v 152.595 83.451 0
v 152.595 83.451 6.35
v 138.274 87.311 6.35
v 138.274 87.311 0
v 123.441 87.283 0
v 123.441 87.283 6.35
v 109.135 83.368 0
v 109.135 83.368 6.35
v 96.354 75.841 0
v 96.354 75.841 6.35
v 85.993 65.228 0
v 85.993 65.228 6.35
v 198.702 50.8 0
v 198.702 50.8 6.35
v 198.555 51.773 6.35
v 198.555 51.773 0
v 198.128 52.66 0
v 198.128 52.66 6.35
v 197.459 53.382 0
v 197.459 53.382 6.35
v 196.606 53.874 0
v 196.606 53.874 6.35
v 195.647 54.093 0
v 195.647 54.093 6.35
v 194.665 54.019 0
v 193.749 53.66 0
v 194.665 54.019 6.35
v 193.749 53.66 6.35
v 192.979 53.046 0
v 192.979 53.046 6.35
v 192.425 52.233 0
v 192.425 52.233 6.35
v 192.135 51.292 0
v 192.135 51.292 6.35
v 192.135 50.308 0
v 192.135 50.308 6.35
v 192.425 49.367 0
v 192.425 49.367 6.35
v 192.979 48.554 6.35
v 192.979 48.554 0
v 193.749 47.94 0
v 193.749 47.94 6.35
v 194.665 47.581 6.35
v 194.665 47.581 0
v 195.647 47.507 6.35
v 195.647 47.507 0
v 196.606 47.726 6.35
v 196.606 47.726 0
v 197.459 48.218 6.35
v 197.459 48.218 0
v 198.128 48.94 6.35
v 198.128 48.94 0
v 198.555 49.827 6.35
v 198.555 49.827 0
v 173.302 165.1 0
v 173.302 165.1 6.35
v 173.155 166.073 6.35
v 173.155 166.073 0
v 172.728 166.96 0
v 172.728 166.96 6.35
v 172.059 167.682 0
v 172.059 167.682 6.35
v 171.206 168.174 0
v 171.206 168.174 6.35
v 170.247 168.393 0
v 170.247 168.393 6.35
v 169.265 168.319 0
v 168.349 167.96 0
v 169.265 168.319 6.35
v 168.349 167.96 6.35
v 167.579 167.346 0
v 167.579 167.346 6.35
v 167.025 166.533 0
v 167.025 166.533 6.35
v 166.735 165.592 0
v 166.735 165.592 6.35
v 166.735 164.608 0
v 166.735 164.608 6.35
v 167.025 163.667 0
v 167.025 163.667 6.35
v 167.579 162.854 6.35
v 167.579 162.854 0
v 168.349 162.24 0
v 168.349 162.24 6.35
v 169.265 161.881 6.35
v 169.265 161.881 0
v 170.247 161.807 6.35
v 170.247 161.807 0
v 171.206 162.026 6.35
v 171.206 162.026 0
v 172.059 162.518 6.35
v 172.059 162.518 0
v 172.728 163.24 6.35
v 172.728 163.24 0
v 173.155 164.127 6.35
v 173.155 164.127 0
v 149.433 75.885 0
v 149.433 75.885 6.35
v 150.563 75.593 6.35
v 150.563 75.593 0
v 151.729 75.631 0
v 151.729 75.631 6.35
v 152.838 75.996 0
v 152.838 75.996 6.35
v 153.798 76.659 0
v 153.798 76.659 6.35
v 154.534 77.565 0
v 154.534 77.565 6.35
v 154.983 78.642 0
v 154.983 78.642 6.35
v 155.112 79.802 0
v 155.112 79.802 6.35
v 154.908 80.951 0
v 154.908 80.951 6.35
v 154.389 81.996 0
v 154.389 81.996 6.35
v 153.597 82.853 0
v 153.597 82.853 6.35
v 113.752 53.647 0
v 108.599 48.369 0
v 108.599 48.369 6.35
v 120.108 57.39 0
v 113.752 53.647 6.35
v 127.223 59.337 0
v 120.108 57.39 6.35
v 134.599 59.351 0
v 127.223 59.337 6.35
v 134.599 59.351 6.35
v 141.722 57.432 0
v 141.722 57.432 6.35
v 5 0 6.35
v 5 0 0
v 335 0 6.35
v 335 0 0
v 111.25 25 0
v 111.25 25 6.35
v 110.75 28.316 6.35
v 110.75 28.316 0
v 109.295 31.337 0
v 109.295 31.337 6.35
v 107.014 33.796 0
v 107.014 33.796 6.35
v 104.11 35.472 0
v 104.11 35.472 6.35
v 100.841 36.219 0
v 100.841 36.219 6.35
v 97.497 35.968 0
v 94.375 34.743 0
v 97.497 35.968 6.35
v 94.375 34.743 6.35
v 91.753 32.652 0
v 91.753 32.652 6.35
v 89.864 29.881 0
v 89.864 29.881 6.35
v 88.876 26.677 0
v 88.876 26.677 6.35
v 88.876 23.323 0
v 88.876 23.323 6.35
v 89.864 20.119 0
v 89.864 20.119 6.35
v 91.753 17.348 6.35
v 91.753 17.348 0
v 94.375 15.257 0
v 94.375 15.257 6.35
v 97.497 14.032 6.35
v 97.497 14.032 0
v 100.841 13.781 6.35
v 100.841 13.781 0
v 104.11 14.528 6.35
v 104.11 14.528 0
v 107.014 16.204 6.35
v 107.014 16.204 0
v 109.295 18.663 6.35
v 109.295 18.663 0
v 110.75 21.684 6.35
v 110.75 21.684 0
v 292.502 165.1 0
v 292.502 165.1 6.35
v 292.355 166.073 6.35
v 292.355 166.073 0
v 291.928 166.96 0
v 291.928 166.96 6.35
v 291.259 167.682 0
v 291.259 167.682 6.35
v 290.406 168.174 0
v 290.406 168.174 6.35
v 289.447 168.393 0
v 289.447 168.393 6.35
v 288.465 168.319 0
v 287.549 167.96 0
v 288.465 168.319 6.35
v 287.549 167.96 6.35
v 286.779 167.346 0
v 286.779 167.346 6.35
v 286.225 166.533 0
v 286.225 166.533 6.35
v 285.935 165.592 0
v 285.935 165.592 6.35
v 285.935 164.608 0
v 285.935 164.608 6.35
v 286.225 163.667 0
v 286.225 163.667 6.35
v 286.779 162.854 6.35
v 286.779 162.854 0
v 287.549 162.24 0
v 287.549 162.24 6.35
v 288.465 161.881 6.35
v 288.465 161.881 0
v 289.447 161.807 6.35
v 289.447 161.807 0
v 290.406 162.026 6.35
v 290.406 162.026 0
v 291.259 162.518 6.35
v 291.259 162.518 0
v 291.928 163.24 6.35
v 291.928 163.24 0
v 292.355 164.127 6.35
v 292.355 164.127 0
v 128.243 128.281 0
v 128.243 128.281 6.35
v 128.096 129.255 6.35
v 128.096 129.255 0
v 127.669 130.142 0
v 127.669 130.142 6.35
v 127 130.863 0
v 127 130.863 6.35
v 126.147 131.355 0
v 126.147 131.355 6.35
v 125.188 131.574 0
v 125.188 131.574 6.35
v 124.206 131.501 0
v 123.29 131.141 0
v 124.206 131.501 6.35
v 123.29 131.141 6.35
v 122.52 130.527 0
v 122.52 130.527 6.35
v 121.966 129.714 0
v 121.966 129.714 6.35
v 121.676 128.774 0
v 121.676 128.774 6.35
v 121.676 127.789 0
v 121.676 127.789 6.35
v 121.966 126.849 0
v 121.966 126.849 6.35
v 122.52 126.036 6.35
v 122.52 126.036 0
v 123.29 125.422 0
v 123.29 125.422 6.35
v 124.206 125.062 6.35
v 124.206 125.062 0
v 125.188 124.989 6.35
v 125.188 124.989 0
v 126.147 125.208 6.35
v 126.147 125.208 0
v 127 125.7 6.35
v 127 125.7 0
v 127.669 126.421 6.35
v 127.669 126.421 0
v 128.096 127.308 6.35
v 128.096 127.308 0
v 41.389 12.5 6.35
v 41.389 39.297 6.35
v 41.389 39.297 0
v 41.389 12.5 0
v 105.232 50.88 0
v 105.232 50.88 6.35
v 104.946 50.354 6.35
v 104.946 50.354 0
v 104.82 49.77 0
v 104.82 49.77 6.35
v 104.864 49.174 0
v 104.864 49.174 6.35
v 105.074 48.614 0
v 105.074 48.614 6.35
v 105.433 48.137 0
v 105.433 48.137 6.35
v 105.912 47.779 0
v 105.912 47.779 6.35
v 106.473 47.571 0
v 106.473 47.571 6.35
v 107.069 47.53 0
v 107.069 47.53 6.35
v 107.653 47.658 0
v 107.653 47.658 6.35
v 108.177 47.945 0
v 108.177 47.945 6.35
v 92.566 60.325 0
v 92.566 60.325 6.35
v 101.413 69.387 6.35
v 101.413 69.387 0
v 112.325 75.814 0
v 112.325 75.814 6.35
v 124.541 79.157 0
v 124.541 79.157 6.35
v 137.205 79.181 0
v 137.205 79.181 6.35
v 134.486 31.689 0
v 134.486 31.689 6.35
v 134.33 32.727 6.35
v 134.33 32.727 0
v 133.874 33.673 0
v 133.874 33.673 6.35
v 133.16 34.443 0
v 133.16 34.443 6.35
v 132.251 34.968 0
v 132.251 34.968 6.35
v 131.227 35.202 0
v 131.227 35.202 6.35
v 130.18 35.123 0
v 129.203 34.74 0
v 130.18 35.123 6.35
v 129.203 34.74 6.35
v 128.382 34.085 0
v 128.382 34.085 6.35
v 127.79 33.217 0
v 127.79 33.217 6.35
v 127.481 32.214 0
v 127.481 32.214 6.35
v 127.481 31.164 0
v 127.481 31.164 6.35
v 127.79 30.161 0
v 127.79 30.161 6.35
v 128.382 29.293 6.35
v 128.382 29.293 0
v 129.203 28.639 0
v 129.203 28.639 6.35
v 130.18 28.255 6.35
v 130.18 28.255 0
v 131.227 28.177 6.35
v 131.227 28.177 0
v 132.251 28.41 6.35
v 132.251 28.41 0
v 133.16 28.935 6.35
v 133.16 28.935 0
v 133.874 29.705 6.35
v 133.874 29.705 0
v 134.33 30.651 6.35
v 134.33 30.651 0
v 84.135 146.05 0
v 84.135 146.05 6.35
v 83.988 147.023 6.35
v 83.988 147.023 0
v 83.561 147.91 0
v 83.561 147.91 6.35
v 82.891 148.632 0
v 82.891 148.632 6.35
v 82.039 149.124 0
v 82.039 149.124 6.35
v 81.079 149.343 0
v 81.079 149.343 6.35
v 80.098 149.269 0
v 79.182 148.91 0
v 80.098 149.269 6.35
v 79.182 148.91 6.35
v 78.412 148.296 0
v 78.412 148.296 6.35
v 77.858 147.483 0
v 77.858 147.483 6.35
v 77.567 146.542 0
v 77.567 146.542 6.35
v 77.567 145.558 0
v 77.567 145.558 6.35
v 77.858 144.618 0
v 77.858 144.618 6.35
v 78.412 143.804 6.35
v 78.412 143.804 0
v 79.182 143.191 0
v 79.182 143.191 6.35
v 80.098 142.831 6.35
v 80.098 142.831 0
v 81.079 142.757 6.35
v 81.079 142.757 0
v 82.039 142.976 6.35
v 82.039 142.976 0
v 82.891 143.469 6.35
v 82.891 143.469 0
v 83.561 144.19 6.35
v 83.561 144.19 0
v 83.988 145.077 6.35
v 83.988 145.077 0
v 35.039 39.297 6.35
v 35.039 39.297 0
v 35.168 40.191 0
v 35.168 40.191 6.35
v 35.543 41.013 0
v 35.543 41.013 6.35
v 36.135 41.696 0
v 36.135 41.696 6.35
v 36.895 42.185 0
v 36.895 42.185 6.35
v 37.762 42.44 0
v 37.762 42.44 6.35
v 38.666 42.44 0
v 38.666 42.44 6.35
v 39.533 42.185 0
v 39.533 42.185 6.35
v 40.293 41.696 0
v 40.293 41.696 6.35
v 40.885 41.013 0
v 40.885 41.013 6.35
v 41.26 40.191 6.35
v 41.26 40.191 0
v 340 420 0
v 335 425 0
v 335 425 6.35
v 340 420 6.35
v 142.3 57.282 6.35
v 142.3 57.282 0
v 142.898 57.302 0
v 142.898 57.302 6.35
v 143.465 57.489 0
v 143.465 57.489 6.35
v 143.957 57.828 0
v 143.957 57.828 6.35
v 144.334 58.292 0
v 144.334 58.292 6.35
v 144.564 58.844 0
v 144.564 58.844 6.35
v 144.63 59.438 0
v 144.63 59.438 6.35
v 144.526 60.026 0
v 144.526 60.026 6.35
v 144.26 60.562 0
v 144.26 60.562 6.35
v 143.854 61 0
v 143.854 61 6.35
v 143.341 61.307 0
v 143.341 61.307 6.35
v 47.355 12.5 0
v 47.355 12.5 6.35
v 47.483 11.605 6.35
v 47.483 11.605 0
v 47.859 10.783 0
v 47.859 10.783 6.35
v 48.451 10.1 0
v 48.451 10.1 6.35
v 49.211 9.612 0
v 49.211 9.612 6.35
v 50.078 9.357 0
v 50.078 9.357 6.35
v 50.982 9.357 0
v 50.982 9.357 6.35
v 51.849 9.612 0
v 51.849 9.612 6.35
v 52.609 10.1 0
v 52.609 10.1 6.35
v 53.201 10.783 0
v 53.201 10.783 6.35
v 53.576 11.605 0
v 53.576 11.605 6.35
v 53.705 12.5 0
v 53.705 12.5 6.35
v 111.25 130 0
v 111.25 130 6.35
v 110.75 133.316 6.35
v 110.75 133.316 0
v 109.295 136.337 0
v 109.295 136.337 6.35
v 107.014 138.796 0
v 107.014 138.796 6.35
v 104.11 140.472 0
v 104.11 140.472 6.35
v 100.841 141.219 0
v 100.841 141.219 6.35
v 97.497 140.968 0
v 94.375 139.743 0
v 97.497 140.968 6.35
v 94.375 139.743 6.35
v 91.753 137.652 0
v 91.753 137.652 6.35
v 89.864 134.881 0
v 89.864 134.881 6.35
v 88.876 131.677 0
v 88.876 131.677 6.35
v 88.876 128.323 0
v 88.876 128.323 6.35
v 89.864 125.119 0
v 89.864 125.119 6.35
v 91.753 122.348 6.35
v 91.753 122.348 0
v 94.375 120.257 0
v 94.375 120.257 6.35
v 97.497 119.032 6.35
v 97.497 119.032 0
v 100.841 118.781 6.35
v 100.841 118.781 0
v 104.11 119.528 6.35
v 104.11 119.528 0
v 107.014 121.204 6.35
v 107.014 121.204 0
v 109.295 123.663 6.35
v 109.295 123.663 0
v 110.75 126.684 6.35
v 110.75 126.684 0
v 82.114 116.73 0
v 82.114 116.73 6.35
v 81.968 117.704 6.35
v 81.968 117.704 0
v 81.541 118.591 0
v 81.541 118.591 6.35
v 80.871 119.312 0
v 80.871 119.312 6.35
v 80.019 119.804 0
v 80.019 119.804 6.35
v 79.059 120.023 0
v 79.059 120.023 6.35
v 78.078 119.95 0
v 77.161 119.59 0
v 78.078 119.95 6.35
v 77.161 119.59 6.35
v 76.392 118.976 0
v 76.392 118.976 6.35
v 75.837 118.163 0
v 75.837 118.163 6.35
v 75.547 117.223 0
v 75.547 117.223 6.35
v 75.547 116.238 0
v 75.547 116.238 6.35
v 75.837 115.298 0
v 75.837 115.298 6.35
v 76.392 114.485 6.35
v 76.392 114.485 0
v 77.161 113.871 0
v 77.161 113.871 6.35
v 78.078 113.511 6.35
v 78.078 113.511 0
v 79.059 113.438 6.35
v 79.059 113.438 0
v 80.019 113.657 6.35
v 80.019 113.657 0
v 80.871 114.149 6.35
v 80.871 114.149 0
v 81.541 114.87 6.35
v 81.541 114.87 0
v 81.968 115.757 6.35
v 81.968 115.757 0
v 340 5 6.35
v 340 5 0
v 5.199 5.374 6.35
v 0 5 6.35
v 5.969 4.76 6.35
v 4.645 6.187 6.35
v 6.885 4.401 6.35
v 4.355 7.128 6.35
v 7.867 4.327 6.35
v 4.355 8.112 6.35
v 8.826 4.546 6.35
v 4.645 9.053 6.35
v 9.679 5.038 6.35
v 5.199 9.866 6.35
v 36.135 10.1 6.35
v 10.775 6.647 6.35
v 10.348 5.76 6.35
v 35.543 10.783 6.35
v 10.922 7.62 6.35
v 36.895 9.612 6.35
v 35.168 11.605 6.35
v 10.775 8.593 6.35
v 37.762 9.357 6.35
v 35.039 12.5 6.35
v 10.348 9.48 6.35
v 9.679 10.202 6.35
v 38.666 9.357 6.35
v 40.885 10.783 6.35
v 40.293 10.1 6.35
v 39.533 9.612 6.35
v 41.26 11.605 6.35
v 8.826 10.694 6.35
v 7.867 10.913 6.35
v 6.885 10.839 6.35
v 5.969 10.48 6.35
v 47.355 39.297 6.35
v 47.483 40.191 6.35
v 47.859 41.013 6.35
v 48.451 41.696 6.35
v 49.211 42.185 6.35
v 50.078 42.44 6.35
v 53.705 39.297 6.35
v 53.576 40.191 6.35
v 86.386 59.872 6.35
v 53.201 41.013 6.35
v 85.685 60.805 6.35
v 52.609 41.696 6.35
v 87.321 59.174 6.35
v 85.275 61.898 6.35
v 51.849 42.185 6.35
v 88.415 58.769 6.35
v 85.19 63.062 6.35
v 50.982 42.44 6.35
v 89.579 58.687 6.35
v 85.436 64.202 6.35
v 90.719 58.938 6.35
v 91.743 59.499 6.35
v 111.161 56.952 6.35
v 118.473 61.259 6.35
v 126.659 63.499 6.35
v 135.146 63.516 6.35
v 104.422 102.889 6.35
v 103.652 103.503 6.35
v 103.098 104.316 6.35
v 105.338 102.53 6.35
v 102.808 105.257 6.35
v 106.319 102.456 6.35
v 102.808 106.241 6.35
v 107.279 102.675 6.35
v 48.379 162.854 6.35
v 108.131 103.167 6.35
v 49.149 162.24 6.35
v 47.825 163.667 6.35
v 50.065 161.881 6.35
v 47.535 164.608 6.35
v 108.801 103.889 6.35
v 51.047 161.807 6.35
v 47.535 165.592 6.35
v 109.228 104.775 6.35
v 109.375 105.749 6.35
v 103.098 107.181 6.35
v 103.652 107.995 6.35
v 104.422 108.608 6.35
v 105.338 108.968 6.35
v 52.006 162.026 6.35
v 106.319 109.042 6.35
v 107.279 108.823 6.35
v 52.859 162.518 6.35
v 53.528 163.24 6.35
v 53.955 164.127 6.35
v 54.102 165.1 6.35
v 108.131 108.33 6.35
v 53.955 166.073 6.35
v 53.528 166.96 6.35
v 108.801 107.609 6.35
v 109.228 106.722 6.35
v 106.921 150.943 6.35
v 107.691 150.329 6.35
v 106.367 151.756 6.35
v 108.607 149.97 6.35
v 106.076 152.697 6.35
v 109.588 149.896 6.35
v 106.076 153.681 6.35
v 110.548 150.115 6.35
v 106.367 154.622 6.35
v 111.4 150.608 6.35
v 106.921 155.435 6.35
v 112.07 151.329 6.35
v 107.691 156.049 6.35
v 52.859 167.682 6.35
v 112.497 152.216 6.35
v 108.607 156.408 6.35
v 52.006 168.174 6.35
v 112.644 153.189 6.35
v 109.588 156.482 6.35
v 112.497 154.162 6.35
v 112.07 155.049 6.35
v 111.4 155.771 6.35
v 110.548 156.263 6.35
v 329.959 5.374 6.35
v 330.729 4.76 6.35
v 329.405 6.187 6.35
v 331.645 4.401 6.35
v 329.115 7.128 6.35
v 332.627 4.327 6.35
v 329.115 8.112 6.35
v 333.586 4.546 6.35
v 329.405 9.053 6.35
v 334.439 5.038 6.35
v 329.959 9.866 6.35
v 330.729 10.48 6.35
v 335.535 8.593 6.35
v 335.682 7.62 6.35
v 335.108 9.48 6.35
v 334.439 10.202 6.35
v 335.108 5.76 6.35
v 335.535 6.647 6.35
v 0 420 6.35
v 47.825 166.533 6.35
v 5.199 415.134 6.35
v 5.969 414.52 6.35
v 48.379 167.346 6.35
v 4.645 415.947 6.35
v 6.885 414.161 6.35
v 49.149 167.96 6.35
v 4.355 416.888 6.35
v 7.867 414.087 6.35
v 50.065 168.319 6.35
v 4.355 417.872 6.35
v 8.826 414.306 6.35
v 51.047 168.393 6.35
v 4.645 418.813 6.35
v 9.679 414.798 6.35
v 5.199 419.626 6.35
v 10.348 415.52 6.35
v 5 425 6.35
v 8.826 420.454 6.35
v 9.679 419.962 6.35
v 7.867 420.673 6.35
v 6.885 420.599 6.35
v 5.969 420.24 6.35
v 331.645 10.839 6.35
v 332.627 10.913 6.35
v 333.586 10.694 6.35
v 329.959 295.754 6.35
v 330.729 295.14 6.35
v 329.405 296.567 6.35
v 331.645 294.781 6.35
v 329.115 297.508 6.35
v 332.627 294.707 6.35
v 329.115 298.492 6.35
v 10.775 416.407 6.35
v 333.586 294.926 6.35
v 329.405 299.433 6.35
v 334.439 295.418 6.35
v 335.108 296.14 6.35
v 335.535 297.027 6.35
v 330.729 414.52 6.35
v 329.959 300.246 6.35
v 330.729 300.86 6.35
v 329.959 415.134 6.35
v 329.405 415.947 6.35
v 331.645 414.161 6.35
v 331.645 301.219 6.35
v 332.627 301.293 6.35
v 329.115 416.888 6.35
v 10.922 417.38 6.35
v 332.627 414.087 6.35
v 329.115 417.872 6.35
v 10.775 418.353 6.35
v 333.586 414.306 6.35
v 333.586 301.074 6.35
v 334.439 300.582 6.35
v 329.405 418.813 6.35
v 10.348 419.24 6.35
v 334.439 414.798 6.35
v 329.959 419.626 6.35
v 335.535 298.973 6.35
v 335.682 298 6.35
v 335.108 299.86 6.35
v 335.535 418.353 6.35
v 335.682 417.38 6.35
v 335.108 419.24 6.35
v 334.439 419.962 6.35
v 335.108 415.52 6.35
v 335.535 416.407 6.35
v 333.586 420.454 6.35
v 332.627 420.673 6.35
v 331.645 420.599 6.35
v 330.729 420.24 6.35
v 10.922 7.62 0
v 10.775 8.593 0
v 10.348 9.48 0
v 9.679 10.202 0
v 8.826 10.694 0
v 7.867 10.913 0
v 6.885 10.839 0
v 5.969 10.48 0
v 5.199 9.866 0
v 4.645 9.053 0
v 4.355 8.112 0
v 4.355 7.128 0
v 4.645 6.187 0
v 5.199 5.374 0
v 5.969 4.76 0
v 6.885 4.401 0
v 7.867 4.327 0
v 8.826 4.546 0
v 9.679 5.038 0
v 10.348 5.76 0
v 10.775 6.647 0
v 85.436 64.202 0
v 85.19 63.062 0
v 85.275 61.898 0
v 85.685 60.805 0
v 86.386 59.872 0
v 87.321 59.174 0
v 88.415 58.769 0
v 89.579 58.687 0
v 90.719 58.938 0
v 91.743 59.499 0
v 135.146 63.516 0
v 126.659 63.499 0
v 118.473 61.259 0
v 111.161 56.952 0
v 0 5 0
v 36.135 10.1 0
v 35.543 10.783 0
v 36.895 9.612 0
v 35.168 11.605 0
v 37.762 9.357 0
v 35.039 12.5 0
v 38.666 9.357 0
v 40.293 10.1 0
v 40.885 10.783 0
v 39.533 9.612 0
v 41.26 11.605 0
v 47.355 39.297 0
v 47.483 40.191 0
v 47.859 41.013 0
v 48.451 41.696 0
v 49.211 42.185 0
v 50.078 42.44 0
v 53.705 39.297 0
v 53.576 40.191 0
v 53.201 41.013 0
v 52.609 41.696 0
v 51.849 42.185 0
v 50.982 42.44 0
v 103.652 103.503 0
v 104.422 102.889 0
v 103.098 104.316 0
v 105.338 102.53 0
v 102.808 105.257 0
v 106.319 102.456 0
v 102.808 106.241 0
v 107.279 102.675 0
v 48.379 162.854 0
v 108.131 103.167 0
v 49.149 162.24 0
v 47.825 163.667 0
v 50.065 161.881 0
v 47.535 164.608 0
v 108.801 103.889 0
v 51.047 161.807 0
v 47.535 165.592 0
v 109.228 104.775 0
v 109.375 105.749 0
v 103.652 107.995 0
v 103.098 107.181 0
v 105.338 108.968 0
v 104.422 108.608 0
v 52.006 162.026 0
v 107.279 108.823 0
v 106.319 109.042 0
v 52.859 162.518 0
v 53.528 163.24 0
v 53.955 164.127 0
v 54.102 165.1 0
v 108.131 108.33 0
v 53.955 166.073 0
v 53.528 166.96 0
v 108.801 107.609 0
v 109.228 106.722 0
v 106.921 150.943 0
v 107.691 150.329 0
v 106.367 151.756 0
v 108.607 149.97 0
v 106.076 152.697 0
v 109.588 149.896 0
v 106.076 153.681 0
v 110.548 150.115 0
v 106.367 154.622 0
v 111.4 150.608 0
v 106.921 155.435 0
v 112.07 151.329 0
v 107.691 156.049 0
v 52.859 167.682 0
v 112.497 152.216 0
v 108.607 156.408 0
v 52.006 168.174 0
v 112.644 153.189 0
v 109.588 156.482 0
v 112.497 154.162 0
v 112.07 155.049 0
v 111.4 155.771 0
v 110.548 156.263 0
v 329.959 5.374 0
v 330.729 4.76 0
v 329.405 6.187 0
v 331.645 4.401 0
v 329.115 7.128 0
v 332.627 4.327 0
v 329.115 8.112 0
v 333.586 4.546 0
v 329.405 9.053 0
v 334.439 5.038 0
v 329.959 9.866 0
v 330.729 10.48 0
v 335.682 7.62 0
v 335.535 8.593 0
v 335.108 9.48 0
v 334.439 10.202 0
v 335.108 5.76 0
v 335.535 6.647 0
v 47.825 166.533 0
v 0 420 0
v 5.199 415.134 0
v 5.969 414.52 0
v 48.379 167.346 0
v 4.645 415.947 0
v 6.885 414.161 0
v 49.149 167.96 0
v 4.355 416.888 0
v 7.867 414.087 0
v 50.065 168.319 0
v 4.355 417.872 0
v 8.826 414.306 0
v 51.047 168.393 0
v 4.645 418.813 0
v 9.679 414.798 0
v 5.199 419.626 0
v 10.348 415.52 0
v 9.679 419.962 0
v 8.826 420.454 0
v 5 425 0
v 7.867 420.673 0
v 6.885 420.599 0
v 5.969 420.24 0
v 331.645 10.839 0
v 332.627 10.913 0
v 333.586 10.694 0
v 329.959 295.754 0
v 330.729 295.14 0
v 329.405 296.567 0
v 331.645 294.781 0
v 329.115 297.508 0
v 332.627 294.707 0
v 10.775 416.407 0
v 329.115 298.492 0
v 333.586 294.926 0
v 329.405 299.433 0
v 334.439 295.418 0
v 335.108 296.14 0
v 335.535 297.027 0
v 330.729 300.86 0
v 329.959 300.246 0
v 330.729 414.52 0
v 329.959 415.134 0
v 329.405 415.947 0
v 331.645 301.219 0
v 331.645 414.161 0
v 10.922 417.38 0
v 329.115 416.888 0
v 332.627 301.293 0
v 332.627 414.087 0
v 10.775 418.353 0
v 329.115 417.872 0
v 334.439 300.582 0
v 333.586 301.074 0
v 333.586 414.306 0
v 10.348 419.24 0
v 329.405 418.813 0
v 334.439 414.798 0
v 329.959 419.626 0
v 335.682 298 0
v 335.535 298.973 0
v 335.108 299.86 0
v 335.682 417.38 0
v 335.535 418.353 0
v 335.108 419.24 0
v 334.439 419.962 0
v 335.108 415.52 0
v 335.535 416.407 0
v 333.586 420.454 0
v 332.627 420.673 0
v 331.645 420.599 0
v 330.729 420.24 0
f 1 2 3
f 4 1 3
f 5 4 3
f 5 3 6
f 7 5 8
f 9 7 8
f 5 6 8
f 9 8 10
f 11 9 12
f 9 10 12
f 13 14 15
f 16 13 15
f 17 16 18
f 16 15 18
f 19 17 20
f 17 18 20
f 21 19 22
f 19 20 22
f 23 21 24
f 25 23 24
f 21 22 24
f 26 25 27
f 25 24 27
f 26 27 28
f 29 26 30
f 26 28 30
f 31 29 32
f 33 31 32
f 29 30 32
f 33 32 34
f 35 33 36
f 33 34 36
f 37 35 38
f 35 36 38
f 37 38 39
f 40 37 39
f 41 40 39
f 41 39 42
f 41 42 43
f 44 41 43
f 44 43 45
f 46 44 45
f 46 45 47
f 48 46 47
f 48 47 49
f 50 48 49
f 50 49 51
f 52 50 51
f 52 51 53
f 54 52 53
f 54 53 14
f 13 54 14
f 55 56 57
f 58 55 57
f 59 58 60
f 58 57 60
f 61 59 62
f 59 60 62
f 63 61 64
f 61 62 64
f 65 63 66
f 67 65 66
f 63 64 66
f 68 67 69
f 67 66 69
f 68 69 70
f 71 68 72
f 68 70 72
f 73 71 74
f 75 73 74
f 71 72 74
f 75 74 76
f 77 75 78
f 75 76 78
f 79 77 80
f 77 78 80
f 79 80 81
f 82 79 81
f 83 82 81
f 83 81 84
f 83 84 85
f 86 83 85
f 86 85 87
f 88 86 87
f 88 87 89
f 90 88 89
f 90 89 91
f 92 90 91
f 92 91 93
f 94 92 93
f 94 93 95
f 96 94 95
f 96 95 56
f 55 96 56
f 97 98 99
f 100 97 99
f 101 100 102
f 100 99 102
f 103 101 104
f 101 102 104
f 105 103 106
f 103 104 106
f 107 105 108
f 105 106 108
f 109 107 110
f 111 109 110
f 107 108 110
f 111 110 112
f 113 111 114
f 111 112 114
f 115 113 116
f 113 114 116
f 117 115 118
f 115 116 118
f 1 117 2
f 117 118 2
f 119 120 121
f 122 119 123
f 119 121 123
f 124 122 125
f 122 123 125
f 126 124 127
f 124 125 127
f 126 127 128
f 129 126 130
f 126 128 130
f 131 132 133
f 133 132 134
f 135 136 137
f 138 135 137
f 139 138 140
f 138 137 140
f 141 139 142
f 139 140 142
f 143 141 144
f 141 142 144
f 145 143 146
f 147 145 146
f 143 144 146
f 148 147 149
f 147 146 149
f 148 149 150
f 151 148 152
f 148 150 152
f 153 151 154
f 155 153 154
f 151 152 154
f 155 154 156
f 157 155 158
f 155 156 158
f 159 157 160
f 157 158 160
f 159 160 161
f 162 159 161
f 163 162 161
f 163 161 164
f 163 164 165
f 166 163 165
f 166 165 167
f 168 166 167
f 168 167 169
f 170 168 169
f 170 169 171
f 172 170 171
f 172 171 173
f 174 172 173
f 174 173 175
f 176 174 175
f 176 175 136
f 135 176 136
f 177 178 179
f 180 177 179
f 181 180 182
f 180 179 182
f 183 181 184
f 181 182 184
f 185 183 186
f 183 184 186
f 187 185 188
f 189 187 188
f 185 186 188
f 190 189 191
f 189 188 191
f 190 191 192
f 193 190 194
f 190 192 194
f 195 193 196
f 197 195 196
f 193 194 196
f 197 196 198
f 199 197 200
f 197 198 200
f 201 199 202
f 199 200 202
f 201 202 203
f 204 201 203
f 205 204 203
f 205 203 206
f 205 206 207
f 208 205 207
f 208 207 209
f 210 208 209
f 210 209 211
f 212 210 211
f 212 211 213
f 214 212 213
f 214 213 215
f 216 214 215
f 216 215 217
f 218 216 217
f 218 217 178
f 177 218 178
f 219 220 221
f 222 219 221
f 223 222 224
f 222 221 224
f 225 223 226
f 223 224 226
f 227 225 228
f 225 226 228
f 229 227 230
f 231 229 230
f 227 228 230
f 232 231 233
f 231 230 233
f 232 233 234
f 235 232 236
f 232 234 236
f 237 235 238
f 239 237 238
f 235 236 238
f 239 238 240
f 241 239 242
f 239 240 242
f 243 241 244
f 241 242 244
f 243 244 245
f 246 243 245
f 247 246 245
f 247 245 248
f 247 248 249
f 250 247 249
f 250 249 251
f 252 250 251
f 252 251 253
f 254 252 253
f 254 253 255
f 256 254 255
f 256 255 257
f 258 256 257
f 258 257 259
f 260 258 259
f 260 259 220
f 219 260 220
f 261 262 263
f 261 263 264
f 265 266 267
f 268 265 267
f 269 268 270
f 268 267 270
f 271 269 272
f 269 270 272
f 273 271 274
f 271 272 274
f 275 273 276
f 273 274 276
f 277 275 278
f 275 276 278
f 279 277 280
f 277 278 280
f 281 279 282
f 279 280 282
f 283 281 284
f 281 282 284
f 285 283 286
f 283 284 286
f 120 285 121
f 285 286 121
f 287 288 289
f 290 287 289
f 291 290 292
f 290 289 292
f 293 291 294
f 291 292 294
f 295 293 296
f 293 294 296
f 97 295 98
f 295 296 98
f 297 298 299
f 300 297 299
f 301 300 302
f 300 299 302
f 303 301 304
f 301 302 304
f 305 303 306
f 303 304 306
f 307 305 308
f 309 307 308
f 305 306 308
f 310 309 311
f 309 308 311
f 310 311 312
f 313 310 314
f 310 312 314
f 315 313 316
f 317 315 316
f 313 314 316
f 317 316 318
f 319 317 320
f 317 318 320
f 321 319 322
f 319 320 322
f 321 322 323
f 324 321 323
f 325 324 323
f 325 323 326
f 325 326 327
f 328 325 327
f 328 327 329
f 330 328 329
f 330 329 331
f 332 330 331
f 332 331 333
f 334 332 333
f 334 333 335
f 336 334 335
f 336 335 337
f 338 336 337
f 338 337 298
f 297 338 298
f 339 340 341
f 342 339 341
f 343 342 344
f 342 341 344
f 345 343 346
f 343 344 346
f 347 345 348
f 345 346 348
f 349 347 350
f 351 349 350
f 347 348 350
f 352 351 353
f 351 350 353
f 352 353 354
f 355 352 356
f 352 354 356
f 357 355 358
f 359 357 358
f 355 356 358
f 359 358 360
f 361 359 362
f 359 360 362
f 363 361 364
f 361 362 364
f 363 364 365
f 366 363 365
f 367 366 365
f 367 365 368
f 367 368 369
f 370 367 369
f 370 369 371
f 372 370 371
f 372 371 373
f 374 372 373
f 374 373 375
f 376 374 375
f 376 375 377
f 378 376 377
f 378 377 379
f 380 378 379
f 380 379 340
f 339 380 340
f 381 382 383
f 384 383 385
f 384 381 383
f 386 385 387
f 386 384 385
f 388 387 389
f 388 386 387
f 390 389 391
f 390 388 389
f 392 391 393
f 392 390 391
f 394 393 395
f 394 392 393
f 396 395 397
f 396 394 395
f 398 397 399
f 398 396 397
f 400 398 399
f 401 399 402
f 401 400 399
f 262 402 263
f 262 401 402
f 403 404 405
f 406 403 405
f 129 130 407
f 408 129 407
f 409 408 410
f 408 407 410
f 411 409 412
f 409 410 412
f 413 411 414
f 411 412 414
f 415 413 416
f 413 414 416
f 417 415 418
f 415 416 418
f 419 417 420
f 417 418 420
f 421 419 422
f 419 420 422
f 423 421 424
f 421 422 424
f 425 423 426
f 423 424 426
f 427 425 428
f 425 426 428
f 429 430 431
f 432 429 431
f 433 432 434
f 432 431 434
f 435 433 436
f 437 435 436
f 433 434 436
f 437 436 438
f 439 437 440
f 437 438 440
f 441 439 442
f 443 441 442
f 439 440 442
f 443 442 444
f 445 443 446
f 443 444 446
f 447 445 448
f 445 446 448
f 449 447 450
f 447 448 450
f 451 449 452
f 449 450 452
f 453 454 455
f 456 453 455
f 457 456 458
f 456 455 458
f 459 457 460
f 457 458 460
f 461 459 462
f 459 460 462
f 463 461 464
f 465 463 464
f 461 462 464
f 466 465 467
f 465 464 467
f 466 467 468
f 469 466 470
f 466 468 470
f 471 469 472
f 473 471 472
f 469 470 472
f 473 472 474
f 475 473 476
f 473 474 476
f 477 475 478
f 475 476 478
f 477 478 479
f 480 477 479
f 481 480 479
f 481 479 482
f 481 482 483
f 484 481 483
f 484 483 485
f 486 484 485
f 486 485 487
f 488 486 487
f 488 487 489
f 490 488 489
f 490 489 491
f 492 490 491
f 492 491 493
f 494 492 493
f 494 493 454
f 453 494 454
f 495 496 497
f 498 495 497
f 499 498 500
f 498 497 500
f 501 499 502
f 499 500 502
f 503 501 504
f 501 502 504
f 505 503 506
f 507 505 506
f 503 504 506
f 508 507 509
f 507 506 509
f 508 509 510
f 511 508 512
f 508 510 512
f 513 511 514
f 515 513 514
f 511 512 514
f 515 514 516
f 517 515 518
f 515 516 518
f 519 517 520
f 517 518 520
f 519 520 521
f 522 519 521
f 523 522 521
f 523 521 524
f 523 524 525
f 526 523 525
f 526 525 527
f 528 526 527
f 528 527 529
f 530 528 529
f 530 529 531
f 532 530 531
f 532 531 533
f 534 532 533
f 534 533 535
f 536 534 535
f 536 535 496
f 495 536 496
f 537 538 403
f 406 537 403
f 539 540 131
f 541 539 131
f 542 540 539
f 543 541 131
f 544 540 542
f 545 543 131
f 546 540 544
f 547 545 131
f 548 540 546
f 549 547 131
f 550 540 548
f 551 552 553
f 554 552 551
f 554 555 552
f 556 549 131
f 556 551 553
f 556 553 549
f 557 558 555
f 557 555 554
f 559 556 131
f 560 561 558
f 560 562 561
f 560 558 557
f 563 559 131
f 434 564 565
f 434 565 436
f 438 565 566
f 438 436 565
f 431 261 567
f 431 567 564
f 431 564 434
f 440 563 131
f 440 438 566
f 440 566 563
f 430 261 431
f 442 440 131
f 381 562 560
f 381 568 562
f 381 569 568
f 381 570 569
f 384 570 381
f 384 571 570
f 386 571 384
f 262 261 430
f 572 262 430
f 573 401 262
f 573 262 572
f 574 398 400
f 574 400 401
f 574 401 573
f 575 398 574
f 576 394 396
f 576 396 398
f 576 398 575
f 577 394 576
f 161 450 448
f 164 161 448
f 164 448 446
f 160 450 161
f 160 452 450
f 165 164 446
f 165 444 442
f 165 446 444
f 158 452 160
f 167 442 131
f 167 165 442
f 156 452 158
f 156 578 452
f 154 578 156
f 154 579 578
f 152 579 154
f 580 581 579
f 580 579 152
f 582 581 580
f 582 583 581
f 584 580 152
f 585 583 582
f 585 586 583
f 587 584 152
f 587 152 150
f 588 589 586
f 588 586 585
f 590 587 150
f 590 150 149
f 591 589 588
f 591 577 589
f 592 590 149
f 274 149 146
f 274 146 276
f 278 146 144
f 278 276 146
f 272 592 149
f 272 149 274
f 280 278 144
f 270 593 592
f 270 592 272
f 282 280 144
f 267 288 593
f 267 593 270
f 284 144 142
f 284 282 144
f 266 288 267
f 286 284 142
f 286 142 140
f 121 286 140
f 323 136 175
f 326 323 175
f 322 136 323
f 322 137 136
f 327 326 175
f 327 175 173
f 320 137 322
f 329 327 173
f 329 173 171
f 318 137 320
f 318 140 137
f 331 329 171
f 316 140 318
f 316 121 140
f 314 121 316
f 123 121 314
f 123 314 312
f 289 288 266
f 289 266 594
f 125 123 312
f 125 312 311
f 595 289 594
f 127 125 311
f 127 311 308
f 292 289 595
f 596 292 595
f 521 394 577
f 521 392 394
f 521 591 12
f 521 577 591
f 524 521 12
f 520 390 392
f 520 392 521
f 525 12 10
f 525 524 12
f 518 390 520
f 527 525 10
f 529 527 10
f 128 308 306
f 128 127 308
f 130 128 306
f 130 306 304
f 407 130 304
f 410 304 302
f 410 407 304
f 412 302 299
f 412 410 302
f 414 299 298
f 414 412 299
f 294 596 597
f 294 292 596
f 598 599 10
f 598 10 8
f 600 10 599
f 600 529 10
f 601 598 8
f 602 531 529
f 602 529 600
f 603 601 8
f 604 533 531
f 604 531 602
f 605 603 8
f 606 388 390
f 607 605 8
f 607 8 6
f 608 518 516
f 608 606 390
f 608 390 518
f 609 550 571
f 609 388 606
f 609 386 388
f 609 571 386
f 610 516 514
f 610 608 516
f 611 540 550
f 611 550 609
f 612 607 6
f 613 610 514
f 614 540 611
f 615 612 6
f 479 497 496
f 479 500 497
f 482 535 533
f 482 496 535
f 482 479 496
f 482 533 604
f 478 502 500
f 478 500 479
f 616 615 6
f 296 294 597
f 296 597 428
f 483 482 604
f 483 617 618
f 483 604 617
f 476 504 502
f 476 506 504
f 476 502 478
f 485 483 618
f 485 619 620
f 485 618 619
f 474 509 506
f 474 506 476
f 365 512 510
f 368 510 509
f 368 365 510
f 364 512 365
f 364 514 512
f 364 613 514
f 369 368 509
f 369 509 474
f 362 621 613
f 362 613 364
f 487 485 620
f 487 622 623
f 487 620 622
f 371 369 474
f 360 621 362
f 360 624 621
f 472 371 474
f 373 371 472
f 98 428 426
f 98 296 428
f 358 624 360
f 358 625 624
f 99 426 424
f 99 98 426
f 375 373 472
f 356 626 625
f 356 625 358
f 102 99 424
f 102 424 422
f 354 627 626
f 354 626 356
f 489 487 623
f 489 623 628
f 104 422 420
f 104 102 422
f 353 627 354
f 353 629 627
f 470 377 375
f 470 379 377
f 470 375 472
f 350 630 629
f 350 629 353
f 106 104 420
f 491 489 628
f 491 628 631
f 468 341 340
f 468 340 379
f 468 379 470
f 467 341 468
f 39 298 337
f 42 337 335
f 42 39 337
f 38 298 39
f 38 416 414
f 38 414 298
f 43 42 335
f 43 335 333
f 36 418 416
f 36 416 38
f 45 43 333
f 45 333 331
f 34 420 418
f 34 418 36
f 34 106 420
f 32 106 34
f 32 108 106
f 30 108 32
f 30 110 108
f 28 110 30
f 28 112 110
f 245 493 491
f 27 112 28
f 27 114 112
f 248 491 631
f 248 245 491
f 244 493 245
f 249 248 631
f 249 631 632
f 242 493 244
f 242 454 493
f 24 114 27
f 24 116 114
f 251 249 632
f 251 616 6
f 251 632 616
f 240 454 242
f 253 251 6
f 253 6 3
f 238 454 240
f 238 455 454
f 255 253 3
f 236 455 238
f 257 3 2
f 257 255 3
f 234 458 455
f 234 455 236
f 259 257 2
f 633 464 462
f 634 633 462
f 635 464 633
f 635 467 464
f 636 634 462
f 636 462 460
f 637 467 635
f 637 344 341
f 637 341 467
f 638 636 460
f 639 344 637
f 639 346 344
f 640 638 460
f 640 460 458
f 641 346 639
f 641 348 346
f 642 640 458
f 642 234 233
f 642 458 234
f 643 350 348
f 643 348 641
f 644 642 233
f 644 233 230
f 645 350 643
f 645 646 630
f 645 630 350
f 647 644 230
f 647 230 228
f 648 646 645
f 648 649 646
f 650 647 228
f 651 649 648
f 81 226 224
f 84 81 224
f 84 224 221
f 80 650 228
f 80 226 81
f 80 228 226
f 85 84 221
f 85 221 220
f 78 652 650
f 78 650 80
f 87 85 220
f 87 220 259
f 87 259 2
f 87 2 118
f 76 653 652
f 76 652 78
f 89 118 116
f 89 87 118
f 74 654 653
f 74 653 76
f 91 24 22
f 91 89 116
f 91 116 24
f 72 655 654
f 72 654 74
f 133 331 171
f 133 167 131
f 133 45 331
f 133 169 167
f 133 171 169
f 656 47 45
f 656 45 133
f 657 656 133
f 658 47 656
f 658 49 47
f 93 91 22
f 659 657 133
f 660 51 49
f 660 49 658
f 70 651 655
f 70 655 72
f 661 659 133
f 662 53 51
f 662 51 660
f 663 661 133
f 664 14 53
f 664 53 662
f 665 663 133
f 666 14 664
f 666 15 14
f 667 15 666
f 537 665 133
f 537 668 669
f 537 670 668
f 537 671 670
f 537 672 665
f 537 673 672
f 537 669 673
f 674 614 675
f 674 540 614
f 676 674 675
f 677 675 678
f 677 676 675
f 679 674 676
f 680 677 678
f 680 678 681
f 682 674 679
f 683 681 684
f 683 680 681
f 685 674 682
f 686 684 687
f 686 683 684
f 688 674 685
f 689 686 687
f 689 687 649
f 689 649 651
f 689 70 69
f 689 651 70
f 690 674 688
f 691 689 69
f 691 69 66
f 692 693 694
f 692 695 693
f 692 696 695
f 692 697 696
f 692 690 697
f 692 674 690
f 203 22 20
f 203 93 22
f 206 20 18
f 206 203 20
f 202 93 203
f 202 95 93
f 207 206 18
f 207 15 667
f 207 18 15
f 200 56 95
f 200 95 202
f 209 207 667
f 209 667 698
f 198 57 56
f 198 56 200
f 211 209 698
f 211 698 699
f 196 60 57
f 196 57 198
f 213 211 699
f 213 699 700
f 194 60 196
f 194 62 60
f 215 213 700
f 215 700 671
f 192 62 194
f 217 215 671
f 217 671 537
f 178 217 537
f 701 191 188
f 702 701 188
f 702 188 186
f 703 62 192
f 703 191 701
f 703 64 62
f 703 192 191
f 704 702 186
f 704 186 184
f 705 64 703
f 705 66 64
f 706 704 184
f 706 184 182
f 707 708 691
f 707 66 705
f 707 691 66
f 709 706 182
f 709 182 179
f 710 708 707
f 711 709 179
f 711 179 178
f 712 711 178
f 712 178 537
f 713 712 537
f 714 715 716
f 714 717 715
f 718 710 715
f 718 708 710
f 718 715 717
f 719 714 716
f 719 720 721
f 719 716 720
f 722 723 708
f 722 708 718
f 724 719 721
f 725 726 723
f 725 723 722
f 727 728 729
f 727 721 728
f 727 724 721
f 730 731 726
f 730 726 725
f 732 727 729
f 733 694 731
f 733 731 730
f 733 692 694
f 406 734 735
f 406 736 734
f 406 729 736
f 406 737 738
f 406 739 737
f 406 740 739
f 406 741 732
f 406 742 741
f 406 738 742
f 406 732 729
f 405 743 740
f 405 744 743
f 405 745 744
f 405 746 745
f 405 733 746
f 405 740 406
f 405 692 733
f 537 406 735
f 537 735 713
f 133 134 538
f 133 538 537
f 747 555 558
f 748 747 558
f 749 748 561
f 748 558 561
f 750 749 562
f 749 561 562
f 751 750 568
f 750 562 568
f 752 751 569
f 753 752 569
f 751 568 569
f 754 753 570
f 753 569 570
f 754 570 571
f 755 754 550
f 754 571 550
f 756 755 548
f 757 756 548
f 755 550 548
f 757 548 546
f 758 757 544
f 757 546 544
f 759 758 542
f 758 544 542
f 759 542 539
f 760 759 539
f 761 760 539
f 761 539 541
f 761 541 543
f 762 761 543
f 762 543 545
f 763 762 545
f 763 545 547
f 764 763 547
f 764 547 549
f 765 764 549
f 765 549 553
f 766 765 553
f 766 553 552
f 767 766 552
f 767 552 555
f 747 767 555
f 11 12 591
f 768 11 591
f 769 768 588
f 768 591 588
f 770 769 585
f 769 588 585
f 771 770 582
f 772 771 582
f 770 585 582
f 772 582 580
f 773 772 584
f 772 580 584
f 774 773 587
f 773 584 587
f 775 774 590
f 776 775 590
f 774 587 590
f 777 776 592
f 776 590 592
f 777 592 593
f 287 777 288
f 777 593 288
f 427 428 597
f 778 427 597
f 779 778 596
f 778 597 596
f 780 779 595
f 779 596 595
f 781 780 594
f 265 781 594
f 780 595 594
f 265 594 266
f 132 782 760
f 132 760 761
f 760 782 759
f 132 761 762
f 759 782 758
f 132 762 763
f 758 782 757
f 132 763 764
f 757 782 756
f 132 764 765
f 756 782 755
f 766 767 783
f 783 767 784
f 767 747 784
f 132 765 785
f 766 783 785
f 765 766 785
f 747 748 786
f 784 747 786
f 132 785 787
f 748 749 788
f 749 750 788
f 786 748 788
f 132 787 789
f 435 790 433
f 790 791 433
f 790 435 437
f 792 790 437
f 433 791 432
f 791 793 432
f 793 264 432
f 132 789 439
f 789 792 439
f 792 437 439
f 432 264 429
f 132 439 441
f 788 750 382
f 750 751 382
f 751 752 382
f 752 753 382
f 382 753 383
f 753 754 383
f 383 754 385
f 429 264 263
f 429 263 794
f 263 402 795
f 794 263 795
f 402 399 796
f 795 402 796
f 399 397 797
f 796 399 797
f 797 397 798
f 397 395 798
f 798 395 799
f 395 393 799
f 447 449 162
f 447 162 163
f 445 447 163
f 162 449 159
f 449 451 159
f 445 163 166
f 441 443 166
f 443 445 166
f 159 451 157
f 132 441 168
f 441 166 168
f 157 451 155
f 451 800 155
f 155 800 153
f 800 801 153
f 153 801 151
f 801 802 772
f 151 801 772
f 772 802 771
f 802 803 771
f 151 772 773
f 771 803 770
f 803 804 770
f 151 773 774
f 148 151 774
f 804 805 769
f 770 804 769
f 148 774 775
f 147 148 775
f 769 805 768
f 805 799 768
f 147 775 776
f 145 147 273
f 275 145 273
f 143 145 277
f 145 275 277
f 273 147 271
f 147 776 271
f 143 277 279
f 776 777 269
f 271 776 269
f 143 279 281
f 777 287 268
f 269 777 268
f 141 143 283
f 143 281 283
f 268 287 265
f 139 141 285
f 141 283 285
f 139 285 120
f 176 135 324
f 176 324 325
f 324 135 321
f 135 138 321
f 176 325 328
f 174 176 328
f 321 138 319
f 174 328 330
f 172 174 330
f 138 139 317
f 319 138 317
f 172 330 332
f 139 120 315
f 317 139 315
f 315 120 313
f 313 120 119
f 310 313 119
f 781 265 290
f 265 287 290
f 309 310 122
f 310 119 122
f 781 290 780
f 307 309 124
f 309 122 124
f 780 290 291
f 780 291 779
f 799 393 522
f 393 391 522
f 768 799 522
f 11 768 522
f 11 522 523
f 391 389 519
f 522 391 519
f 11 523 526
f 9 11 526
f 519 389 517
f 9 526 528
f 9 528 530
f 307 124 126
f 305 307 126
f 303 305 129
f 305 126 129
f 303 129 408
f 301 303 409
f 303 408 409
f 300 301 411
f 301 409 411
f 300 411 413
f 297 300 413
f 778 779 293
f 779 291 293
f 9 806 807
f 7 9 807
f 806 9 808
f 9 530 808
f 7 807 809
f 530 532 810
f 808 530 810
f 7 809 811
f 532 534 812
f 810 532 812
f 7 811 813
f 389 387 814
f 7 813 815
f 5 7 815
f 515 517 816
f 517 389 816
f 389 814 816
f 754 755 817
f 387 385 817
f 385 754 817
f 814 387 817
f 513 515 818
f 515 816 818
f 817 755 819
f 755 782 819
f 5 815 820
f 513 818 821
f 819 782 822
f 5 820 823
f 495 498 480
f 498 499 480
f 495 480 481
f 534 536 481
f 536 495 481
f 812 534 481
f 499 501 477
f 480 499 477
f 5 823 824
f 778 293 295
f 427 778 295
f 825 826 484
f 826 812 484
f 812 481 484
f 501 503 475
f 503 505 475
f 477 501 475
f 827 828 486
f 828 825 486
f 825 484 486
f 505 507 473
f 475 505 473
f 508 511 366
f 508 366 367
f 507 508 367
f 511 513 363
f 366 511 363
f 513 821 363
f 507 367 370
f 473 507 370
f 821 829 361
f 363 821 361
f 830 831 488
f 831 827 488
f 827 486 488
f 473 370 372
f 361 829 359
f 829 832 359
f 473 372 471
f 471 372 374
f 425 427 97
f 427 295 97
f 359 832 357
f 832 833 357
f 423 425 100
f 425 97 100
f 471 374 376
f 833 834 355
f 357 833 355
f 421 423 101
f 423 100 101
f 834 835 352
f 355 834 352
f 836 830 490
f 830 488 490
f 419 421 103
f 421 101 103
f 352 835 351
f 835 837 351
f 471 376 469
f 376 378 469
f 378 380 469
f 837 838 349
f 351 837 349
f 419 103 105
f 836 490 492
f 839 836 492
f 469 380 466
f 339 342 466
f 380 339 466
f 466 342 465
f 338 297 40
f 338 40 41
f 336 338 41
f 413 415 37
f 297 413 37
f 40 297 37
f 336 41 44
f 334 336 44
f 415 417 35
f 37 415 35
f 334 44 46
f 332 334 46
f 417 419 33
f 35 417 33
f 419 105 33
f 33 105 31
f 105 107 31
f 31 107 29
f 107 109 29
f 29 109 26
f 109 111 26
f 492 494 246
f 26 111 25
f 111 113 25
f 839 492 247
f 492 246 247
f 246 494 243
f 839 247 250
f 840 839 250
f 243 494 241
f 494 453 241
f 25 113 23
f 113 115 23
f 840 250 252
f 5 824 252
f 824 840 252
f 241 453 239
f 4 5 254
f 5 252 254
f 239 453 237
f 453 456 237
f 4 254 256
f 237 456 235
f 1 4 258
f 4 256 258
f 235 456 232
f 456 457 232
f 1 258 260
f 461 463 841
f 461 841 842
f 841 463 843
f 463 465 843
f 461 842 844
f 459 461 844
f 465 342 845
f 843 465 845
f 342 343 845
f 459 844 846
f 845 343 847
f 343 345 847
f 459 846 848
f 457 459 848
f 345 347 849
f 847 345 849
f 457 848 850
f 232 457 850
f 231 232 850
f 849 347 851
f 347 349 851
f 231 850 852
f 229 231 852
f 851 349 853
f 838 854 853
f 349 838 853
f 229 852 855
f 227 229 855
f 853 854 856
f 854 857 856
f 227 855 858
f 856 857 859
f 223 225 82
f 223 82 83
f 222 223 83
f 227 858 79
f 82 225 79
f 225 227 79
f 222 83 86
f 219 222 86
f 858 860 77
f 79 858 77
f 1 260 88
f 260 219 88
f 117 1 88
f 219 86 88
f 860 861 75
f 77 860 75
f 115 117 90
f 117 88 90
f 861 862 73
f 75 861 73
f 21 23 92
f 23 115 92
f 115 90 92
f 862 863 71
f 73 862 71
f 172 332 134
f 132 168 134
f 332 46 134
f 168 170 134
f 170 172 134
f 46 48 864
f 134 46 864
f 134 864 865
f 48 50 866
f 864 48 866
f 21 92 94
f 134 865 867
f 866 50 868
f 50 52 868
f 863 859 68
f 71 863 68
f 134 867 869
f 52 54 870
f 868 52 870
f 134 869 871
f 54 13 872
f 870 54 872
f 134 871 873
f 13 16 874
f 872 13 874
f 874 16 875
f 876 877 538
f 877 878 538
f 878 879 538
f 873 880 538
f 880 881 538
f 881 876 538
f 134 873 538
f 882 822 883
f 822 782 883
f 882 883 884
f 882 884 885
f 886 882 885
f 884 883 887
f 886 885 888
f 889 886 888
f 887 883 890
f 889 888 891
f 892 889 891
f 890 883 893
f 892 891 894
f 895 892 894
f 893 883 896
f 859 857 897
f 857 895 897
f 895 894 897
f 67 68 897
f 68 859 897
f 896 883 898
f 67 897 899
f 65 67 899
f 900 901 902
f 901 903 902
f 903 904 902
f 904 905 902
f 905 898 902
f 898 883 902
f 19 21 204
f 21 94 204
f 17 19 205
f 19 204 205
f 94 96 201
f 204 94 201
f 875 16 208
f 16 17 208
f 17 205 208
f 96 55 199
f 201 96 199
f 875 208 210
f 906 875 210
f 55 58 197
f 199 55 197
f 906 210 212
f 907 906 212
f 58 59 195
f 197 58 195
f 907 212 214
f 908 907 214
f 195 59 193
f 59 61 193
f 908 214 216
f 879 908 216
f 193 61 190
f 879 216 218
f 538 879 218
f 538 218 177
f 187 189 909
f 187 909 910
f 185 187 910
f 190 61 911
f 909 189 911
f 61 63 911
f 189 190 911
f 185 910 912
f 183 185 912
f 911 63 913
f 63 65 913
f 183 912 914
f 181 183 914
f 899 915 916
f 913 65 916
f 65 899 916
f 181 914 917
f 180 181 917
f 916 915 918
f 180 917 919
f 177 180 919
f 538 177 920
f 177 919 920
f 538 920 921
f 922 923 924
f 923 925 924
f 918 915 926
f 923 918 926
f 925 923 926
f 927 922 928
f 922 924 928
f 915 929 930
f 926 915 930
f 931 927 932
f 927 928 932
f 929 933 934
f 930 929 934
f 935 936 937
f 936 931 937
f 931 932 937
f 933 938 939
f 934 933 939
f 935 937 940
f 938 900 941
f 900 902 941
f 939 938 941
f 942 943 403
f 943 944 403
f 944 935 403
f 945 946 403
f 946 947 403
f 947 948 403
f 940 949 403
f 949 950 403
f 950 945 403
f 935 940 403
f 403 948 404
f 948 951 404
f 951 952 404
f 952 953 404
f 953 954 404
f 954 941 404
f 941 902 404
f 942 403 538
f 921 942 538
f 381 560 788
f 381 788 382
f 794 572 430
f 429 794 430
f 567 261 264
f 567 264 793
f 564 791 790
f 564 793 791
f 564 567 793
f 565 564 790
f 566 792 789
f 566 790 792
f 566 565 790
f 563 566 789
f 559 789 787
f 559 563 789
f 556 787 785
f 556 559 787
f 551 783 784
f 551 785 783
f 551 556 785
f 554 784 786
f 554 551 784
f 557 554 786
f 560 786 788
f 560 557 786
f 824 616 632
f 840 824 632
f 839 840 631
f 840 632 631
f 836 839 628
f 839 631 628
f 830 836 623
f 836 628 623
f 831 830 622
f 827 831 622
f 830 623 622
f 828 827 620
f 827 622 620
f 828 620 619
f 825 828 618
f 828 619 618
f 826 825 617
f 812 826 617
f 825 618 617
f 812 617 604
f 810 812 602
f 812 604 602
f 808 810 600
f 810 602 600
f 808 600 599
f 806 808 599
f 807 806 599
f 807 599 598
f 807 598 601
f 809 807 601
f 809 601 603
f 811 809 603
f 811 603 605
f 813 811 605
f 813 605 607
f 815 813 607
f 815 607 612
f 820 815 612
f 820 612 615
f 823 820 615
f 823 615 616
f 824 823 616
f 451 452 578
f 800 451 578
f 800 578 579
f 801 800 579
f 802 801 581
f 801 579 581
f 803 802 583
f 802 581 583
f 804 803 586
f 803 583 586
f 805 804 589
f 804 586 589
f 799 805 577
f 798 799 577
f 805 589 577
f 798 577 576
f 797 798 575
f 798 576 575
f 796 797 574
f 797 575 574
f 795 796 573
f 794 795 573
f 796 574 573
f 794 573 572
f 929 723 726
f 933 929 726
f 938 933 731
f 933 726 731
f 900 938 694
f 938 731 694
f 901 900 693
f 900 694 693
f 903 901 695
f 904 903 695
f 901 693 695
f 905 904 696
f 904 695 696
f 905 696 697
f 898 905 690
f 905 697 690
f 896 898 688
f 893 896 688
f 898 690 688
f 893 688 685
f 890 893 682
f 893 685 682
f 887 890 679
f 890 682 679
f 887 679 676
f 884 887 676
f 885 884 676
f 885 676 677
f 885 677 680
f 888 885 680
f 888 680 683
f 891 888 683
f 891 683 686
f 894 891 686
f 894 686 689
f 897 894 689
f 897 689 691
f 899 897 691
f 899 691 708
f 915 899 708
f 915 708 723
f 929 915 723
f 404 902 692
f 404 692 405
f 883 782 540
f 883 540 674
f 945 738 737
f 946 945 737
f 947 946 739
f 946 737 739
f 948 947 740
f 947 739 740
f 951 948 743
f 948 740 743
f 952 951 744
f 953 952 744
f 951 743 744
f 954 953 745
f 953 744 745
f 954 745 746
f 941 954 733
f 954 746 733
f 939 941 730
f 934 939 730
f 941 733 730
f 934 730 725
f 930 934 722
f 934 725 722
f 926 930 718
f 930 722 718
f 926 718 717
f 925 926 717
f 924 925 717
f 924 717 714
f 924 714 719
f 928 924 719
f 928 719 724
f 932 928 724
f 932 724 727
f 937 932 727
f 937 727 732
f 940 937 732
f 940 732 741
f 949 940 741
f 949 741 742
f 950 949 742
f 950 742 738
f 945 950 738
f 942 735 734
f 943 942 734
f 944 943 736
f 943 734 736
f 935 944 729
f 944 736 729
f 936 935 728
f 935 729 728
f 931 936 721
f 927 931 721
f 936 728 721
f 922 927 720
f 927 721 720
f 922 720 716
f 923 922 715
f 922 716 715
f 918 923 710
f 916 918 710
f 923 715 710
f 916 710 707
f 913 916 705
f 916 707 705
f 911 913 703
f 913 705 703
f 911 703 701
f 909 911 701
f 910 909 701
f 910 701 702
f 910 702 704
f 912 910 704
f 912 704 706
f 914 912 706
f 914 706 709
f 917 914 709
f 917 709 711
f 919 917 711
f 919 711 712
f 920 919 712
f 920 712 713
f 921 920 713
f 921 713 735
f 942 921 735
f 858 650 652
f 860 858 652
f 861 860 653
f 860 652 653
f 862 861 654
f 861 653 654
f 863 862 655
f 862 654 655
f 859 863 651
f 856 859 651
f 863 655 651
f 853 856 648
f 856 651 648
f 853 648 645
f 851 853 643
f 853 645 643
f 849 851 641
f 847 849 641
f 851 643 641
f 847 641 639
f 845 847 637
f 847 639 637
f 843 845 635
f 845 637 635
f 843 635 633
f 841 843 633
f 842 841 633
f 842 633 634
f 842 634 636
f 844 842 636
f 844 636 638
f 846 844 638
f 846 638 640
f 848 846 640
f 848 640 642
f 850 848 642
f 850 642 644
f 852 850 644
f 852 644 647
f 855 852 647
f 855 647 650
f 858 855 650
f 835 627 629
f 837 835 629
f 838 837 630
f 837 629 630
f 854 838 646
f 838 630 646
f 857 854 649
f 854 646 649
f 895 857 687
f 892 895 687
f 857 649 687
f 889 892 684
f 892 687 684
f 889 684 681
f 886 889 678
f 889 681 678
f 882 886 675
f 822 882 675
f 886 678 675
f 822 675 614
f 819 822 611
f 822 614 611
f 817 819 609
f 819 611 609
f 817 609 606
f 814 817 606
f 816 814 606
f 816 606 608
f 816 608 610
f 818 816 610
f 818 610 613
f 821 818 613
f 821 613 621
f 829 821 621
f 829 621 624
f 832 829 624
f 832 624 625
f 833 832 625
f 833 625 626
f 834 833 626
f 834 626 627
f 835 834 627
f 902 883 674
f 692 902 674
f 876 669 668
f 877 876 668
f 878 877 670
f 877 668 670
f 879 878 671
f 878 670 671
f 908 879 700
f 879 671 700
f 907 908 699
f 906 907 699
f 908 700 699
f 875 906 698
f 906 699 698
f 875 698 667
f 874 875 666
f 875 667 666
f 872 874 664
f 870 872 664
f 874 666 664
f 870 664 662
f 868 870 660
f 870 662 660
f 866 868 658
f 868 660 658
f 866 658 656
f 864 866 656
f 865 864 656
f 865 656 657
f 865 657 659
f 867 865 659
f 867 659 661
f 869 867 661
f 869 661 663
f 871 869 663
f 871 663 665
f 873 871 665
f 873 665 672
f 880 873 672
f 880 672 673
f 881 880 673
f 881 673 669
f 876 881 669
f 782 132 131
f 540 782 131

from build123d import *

# Parameters (mm, degrees)
SKETCH1_W           = 340
SKETCH1_H           = 425
BOSS_EXTRUDE1_DEPTH = 6.35
SKETCH3_R           = 11.25
CUT_EXTRUDE1_DEPTH  = 7.35
SKETCH5_R           = 3.522259684
CUT_EXTRUDE2_DEPTH  = 10
CUT_EXTRUDE3_DEPTH  = 17
SKETCH8_R           = 3.302
CUT_EXTRUDE4_DEPTH  = 7.35
SKETCH9_R           = 3.302
CUT_EXTRUDE5_DEPTH  = 7.35
CHAMFER1_SIZE       = 5


with BuildPart() as part:
    # Sketch1 → Boss-Extrude1 (new body)
    with BuildSketch(Plane.XY):
        with Locations((170, 212.5)):
            Rectangle(SKETCH1_W, SKETCH1_H)
    extrude(amount=BOSS_EXTRUDE1_DEPTH)

    # Sketch3 → Cut-Extrude1 (cut, through all)
    with BuildSketch(Plane.XY.offset(6.35)):
        with Locations((100, 130)):
            Circle(SKETCH3_R)
        with Locations((100, 25)):
            Circle(SKETCH3_R)
    extrude(amount=-CUT_EXTRUDE1_DEPTH, mode=Mode.SUBTRACT)

    # Sketch5 → Cut-Extrude2 (cut)
    with BuildSketch(Plane.XY.offset(6.35)):
        with Locations((130.96390727, 31.689171279)):
            Circle(SKETCH5_R)
        with BuildLine():
            ThreePointArc((108.598685831, 48.368705745), (123.600570447, 58.5999734), (141.721573091, 57.431794029))
            ThreePointArc((141.721573091, 57.431794029), (144.468906639, 58.559694013), (143.341006655, 61.307027562))
            ThreePointArc((143.341006655, 61.307027562), (122.49211114, 62.651061892), (105.231878303, 50.879603407))
            ThreePointArc((105.231878303, 50.879603407), (105.659833236, 47.940750812), (108.598685831, 48.368705745))
        make_face()
        with BuildLine():
            ThreePointArc((92.56626903, 60.325361276), (118.322192796, 77.890870979), (149.433161493, 75.885287041))
            ThreePointArc((149.433161493, 75.885287041), (154.797003183, 78.087377485), (152.594912738, 83.451219175))
            ThreePointArc((152.594912738, 83.451219175), (116.15805796, 85.800138986), (85.992978141, 65.227590044))
            ThreePointArc((85.992978141, 65.227590044), (86.828509201, 59.489830216), (92.56626903, 60.325361276))
        make_face()
    extrude(amount=-CUT_EXTRUDE2_DEPTH, mode=Mode.SUBTRACT)

    # Sketch6 → Cut-Extrude3 (cut)
    with BuildSketch(Plane.XY.offset(6.35)):
        with BuildLine():
            Line((41.389095845, 39.296844069), (41.389095845, 12.5))
            ThreePointArc((41.389095845, 12.5), (38.214095845, 9.325), (35.039095845, 12.5))
            Line((35.039095845, 12.5), (35.039095845, 39.296844069))
            ThreePointArc((35.039095845, 39.296844069), (38.214095845, 42.471844069), (41.389095845, 39.296844069))
        make_face()
        with BuildLine():
            Line((47.354853439, 39.296844069), (47.354853439, 12.5))
            ThreePointArc((47.354853439, 12.5), (50.529853439, 9.325), (53.704853439, 12.5))
            Line((53.704853439, 12.5), (53.704853439, 39.296844069))
            ThreePointArc((53.704853439, 39.296844069), (50.529853439, 42.471844069), (47.354853439, 39.296844069))
        make_face()
    extrude(amount=-CUT_EXTRUDE3_DEPTH, mode=Mode.SUBTRACT)

    # Sketch8 → Cut-Extrude4 (cut, through all)
    with BuildSketch(Plane.XY.offset(6.35)):
        with Locations((332.38, 417.38)):
            Circle(SKETCH8_R)
        with Locations((7.62, 417.38)):
            Circle(SKETCH8_R)
        with Locations((50.8, 165.1)):
            Circle(SKETCH8_R)
        with Locations((332.38, 7.62)):
            Circle(SKETCH8_R)
        with Locations((195.4, 50.8)):
            Circle(SKETCH8_R)
        with Locations((289.2, 165.1)):
            Circle(SKETCH8_R)
        with Locations((170, 165.1)):
            Circle(SKETCH8_R)
        with Locations((332.38, 298)):
            Circle(SKETCH8_R)
        with Locations((7.62, 7.62)):
            Circle(SKETCH8_R)
    extrude(amount=-CUT_EXTRUDE4_DEPTH, mode=Mode.SUBTRACT)

    # Sketch9 → Cut-Extrude5 (cut, through all)
    with BuildSketch(Plane.XY.offset(6.35)):
        with Locations((78.812282865, 116.730461854)):
            Circle(SKETCH9_R)
        with Locations((80.832554611, 146.050203652)):
            Circle(SKETCH9_R)
        with Locations((109.341584408, 153.189109529)):
            Circle(SKETCH9_R)
        with Locations((124.940862061, 128.281454206)):
            Circle(SKETCH9_R)
        with Locations((106.072716055, 105.748770759)):
            Circle(SKETCH9_R)
    extrude(amount=-CUT_EXTRUDE5_DEPTH, mode=Mode.SUBTRACT)

    # Chamfer1
    chamfer1_edges = [part.edges().sort_by_distance(p)[0] for p in [
        (0, 425, 3.175),
        (340, 425, 3.175),
        (340, 0, 3.175),
        (0, 0, 3.175),
    ]]
    chamfer(chamfer1_edges, length=CHAMFER1_SIZE)


solid = part.part
